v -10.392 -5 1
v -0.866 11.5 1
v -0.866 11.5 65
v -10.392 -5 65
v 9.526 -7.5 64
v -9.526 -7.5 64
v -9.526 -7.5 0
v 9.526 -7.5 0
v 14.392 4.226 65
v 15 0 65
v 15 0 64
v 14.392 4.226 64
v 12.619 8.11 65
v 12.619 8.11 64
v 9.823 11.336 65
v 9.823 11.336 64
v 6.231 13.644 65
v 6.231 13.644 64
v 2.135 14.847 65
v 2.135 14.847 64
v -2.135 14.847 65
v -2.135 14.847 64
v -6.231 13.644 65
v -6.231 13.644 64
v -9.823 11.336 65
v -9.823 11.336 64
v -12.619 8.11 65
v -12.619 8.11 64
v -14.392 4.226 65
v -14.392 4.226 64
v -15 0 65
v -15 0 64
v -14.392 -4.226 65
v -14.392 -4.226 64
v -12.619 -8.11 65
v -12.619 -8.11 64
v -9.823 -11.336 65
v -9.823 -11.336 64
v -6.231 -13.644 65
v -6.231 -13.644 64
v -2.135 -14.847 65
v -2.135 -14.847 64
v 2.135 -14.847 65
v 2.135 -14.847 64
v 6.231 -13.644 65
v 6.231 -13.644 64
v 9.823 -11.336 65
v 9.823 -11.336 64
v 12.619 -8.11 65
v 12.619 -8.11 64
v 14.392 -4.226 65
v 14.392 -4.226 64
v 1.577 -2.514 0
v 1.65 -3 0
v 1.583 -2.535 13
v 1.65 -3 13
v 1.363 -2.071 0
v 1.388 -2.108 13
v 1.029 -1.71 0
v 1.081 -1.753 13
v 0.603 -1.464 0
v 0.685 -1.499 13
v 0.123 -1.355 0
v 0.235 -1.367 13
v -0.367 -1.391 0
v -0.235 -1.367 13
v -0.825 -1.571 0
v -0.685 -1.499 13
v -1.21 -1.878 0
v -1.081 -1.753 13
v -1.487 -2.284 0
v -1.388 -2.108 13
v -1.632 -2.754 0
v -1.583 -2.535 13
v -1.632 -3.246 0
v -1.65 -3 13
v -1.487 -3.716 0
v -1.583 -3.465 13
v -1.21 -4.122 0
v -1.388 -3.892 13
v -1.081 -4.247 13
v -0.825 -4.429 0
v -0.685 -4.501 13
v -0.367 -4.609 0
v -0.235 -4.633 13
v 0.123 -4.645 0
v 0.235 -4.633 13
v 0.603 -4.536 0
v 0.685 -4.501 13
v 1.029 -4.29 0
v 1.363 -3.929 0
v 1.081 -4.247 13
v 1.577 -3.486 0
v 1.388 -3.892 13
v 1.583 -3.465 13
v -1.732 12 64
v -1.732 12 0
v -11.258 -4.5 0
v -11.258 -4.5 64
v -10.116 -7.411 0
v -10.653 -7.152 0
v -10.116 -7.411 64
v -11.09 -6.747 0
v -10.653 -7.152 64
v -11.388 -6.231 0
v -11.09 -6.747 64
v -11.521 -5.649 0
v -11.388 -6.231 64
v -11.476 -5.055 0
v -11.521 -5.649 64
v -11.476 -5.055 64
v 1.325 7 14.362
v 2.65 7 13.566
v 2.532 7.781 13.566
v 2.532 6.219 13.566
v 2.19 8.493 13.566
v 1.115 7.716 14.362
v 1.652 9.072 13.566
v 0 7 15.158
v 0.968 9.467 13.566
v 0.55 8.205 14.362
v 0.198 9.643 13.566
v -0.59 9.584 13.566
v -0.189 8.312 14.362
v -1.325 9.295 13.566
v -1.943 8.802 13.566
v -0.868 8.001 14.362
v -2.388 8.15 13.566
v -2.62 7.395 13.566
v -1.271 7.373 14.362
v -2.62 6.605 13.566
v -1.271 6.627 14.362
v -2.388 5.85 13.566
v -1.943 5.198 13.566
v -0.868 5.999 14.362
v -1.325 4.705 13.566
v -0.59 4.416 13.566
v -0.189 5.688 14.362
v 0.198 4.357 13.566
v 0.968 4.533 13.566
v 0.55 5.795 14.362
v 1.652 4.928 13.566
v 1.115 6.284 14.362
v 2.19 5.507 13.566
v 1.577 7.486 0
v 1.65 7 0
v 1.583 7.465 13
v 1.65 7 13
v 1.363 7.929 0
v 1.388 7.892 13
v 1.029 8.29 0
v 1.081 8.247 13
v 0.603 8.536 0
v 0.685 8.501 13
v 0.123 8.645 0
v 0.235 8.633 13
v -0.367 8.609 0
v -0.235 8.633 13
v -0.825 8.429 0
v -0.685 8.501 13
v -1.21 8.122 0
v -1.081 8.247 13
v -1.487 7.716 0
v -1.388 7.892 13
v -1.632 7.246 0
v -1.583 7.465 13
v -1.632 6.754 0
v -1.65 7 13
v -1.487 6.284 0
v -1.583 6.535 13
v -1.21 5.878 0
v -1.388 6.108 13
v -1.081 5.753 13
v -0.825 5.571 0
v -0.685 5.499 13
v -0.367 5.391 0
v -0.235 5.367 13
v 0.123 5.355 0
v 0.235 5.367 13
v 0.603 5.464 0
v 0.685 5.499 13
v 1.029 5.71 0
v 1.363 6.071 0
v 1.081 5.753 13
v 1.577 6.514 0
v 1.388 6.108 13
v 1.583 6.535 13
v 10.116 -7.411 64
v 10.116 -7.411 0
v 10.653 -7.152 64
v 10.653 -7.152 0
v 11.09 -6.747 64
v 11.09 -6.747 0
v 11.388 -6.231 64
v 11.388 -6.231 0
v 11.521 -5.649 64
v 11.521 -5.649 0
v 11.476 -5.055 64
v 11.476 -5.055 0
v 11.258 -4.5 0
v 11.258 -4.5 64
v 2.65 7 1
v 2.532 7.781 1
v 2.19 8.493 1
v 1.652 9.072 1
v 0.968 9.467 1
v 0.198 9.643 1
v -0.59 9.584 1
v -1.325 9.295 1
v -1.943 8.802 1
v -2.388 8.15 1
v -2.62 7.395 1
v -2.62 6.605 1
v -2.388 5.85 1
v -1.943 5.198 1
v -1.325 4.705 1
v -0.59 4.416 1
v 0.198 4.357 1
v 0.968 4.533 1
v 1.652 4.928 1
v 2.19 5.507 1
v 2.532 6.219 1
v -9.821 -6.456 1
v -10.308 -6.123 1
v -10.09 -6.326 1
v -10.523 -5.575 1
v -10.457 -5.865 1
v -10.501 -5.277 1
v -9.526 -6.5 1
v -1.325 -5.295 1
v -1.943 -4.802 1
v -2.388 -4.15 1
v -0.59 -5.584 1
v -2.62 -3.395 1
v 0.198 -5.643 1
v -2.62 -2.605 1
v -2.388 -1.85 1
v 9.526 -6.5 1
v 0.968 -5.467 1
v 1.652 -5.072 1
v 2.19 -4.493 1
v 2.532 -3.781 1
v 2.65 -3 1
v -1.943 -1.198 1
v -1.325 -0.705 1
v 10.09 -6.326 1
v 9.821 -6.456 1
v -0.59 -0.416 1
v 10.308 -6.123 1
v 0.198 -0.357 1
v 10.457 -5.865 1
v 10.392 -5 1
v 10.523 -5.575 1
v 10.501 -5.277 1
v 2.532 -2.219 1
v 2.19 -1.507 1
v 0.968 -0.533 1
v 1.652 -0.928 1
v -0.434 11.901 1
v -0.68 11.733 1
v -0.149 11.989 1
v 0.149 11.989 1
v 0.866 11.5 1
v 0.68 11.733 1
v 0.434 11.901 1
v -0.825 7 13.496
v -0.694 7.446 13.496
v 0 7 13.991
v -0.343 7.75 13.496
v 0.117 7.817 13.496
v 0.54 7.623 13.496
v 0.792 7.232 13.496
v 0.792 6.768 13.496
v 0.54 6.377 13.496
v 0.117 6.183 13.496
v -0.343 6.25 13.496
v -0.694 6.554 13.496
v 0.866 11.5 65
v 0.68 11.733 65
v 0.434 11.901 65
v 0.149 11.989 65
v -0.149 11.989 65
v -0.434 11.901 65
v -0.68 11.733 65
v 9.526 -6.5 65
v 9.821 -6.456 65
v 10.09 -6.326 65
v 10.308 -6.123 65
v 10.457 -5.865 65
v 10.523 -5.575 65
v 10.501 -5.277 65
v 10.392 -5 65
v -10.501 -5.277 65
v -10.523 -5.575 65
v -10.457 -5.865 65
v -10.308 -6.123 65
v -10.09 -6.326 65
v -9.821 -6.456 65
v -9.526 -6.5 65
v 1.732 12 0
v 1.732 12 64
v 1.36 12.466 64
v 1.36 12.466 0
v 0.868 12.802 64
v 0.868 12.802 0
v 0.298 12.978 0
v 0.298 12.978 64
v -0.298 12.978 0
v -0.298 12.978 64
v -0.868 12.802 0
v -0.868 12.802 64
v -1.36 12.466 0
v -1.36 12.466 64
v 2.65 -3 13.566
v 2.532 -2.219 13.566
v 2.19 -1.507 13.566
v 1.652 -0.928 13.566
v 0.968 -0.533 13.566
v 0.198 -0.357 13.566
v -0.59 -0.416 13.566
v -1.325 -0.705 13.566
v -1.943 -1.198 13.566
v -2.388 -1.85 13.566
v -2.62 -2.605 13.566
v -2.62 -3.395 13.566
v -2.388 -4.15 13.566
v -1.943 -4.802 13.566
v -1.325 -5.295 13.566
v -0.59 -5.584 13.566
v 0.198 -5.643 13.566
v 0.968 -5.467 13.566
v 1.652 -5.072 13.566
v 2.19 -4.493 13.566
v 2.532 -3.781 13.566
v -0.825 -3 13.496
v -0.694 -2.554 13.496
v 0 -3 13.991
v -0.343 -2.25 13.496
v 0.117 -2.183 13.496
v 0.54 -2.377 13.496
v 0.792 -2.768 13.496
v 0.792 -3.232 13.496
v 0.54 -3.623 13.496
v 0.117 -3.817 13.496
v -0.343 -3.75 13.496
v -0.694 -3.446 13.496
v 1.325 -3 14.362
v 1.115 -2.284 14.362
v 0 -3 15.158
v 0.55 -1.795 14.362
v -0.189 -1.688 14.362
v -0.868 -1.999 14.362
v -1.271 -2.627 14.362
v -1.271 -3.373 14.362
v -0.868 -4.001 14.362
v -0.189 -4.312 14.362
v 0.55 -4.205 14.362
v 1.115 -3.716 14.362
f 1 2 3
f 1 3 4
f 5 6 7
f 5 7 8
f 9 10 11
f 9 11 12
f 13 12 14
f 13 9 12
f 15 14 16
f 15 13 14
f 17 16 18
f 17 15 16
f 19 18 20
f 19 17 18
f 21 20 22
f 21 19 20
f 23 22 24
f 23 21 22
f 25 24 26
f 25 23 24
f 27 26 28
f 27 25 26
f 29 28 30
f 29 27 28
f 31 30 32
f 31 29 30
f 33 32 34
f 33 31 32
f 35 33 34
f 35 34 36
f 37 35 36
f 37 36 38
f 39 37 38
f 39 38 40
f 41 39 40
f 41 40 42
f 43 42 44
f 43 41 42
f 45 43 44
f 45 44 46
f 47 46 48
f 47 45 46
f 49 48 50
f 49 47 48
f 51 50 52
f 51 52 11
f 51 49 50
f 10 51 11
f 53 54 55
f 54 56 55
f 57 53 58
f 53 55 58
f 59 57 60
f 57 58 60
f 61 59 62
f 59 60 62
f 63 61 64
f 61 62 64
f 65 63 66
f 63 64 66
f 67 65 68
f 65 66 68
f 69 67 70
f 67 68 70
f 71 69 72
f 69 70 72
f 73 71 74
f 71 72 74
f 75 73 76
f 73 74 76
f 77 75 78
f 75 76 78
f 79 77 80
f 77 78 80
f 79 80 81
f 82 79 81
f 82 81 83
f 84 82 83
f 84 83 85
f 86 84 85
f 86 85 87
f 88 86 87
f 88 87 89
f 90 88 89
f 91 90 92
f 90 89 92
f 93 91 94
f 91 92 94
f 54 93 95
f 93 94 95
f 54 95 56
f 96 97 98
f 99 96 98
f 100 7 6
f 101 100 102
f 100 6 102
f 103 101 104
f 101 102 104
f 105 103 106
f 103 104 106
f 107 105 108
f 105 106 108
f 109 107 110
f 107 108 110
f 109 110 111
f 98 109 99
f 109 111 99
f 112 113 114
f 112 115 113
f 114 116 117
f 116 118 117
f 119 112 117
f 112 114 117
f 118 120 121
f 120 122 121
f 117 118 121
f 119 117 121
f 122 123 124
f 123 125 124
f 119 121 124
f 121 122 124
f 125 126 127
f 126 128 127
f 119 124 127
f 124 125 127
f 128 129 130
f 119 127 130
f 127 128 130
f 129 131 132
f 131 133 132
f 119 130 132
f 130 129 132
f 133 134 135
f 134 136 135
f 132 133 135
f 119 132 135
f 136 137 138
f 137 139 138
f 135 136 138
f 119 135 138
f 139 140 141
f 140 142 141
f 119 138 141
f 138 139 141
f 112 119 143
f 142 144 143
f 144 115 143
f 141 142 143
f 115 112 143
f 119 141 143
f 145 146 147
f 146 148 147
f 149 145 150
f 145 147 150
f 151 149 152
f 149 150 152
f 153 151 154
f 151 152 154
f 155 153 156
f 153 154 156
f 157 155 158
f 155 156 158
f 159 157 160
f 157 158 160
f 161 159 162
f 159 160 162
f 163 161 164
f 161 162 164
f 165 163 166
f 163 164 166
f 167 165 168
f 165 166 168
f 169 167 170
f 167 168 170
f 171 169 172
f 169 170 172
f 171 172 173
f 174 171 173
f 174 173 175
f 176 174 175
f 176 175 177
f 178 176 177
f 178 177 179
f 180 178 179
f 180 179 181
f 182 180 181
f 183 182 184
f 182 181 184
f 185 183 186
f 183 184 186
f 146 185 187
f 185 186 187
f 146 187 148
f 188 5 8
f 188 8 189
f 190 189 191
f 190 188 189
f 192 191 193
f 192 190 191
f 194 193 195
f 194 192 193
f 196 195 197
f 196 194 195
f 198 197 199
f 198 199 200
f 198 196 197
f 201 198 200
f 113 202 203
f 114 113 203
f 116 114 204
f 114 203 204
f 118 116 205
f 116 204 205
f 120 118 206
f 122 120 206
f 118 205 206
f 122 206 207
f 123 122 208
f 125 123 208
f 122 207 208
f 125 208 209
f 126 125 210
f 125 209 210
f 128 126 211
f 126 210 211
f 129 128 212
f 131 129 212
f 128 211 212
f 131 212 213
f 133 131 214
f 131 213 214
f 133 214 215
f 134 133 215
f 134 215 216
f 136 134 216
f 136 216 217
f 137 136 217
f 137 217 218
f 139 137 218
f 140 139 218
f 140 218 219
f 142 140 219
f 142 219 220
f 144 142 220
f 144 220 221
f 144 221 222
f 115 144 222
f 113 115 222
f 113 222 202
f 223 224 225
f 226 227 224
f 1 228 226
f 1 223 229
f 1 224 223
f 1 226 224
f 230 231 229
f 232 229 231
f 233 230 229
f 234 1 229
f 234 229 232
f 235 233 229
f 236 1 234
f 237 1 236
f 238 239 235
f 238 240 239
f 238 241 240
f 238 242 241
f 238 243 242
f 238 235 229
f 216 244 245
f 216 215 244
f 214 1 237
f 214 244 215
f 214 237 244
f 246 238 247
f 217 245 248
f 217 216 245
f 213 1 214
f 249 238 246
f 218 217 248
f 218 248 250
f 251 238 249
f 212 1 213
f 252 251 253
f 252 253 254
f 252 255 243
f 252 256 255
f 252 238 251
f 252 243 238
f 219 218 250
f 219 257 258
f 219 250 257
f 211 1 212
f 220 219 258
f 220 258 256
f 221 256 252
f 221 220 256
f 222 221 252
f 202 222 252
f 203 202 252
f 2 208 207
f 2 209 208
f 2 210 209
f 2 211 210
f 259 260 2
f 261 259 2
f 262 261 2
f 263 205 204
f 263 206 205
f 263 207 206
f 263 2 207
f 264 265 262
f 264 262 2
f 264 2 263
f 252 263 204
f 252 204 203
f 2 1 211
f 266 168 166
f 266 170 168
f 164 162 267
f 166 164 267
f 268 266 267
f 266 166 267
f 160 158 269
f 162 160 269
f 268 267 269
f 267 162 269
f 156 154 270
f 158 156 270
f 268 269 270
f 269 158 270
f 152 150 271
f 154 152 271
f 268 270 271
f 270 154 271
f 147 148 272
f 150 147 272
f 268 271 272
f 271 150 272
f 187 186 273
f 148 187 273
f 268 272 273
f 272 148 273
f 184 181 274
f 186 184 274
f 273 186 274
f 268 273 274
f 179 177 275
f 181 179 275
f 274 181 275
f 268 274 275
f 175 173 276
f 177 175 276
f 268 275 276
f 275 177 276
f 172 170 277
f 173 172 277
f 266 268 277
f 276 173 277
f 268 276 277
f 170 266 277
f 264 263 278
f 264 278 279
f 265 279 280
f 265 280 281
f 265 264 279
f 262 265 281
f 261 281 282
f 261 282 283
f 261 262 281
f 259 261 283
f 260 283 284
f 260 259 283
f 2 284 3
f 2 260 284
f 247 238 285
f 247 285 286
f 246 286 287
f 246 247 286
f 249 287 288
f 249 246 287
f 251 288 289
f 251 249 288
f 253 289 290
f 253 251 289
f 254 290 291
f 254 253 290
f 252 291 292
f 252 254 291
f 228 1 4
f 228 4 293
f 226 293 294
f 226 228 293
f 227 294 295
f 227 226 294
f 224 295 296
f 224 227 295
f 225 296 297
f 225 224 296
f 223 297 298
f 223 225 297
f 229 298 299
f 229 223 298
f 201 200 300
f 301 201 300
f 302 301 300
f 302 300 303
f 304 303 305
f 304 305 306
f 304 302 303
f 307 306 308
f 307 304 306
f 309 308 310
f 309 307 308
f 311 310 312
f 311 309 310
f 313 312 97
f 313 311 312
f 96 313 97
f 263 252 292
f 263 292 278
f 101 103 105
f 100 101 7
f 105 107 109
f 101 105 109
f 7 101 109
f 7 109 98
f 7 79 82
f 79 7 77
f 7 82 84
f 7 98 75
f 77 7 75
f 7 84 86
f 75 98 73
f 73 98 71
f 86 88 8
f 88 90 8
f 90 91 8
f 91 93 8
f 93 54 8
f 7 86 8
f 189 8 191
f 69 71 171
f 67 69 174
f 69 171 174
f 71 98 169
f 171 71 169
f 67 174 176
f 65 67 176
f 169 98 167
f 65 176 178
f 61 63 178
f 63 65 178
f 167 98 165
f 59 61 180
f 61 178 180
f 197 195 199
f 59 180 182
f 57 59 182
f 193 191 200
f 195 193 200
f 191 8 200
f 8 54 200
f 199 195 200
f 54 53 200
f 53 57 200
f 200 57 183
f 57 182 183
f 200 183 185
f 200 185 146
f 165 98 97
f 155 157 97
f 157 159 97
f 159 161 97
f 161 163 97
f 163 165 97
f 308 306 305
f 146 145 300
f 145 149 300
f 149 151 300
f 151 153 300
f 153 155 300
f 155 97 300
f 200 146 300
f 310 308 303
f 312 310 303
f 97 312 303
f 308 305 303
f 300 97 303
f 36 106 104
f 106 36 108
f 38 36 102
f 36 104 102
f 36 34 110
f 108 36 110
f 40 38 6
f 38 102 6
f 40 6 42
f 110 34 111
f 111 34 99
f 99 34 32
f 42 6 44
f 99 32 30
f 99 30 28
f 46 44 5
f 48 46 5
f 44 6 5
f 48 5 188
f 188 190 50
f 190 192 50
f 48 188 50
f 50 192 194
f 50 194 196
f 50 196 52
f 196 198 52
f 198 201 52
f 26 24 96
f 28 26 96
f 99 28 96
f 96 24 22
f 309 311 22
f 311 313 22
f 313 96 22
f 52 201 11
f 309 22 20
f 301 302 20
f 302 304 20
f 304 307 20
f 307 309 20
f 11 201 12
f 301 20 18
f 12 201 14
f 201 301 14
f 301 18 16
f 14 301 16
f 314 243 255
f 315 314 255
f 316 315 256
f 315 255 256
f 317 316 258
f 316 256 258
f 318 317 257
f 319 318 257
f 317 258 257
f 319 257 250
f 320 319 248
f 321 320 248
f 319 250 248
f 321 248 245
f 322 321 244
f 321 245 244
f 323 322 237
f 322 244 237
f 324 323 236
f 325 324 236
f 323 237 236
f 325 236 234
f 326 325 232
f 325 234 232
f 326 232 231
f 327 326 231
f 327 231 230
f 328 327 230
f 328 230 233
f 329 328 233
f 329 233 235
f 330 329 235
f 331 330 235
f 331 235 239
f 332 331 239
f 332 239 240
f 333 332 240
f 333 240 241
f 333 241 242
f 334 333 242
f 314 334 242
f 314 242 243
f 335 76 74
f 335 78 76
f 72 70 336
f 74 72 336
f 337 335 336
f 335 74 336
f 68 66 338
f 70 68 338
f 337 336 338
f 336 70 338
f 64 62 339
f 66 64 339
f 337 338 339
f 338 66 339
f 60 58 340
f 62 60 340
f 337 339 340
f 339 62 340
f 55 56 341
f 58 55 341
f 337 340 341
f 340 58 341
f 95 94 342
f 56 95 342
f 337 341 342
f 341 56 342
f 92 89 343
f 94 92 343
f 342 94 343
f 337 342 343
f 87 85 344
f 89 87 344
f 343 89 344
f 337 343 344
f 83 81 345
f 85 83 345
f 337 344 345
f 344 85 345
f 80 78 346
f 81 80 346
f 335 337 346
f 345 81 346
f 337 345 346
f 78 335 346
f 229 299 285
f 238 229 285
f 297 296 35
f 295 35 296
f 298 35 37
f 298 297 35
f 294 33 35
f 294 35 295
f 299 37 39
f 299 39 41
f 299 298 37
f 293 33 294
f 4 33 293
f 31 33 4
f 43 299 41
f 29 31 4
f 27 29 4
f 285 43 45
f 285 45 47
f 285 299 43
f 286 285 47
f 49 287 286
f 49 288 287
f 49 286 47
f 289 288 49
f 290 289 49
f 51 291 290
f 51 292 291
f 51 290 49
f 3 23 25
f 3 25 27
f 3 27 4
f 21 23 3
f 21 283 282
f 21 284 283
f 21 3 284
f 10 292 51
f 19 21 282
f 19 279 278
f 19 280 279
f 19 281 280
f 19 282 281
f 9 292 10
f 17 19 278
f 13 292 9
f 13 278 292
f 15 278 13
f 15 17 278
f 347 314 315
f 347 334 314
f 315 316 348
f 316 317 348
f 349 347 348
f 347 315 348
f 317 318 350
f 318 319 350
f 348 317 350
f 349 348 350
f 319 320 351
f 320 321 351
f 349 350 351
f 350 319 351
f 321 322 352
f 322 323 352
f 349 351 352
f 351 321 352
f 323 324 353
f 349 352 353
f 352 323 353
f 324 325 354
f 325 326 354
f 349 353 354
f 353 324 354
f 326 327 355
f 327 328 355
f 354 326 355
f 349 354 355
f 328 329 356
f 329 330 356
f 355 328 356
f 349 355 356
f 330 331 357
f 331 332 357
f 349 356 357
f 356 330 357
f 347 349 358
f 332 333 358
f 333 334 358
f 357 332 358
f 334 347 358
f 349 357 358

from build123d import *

# Parameters (mm, degrees)
BOSS_EXTRUDE1_DEPTH       = 65
FILLET1_R                 = 2
M4X0_7_TAPPED_HOLE1_D     = 3.3
M4X0_7_TAPPED_HOLE1_DEPTH = 13
M4X0_7_TAPPED_HOLE1_TIP   = 0.991420021
SKETCH5_R                 = 15
BOSS_EXTRUDE3_DEPTH       = 1
SHELL2_START              = 1
SHELL2_OUTLINE_R          = 2.65
SHELL2_DEPTH              = 64
SHELL2_START_2            = 15.158053519
SHELL2_2_OUTLINE_R        = 2.65
SHELL2_2_DEPTH            = 49.841946481


with BuildPart() as part:
    # Sketch1 → Boss-Extrude1 (new body)
    with BuildSketch(Plane.XY):
        Polygon((-12.990381057, -7.5), (12.990381057, -7.5), (0, 15), align=None)
    extrude(amount=BOSS_EXTRUDE1_DEPTH)

    # Fillet1
    fillet1_edges = [part.edges().sort_by_distance(p)[0] for p in [
        (-12.990381057, -7.5, 32.5),
        (0, 15, 32.5),
        (12.990381057, -7.5, 32.5),
    ]]
    fillet(fillet1_edges, radius=FILLET1_R)

    # M4x0.7 Tapped Hole1
    with Locations(Plane(origin=(0, 0, 0), x_dir=(-1, 0, 0), z_dir=(0, 0, -1))):
        with Locations((0, -3), (0, 7)):
            Hole(M4X0_7_TAPPED_HOLE1_D / 2, depth=M4X0_7_TAPPED_HOLE1_DEPTH)
            with Locations((0, 0, -(M4X0_7_TAPPED_HOLE1_DEPTH + M4X0_7_TAPPED_HOLE1_TIP / 2))):  # 118° drill point
                Cone(0, M4X0_7_TAPPED_HOLE1_D / 2, M4X0_7_TAPPED_HOLE1_TIP, mode=Mode.SUBTRACT)

    # Sketch5 → Boss-Extrude3 (add)
    with BuildSketch(Plane.XY.offset(65)):
        Circle(SKETCH5_R)
    extrude(amount=-BOSS_EXTRUDE3_DEPTH)

    # Shell2: read off the stored shape, not the designer's step
    # Shell2 outline → Shell2 (cut)
    with BuildSketch(Plane.XY.offset(SHELL2_START)):
        with BuildLine():
            Line((-9.526279442, -6.5), (9.526279442, -6.5))
            ThreePointArc((9.526279442, -6.5), (10.392304845, -6), (10.392304845, -5))
            Line((10.392304845, -5), (0.866025404, 11.5))
            ThreePointArc((0.866025404, 11.5), (0, 12), (-0.866025404, 11.5))
            Line((-0.866025404, 11.5), (-10.392304845, -5))
            ThreePointArc((-10.392304845, -5), (-10.392304845, -6), (-9.526279442, -6.5))
        make_face()
        with Locations((0, -3)):
            Circle(SHELL2_OUTLINE_R, mode=Mode.SUBTRACT)
        with Locations((0, 7)):
            Circle(SHELL2_OUTLINE_R, mode=Mode.SUBTRACT)
    extrude(amount=SHELL2_DEPTH, mode=Mode.SUBTRACT)

    # Shell2 2 outline → Shell2 2 (cut)
    with BuildSketch(Plane.XY.offset(SHELL2_START_2)):
        with Locations((0, 7)):
            Circle(SHELL2_2_OUTLINE_R)
        with Locations((0, -3)):
            Circle(SHELL2_2_OUTLINE_R)
    extrude(amount=SHELL2_2_DEPTH, mode=Mode.SUBTRACT)

    # Shell2 3 outline → Shell2 3 (revolve, cut)
    with BuildSketch(Plane.XZ.offset(-7)):
        Polygon((2.65, 15.158053519), (0, 15.158053519), (2.65, 13.565772778), align=None)
    revolve(axis=Axis((0, 7, 0), (0, 0, 1)), mode=Mode.SUBTRACT)

    # Shell2 4 outline → Shell2 4 (revolve, cut)
    with BuildSketch(Plane.XZ.offset(3)):
        Polygon((2.65, 15.158053519), (0, 15.158053519), (2.65, 13.565772778), align=None)
    revolve(axis=Axis((0, -3, 0), (0, 0, 1)), mode=Mode.SUBTRACT)


solid = part.part
